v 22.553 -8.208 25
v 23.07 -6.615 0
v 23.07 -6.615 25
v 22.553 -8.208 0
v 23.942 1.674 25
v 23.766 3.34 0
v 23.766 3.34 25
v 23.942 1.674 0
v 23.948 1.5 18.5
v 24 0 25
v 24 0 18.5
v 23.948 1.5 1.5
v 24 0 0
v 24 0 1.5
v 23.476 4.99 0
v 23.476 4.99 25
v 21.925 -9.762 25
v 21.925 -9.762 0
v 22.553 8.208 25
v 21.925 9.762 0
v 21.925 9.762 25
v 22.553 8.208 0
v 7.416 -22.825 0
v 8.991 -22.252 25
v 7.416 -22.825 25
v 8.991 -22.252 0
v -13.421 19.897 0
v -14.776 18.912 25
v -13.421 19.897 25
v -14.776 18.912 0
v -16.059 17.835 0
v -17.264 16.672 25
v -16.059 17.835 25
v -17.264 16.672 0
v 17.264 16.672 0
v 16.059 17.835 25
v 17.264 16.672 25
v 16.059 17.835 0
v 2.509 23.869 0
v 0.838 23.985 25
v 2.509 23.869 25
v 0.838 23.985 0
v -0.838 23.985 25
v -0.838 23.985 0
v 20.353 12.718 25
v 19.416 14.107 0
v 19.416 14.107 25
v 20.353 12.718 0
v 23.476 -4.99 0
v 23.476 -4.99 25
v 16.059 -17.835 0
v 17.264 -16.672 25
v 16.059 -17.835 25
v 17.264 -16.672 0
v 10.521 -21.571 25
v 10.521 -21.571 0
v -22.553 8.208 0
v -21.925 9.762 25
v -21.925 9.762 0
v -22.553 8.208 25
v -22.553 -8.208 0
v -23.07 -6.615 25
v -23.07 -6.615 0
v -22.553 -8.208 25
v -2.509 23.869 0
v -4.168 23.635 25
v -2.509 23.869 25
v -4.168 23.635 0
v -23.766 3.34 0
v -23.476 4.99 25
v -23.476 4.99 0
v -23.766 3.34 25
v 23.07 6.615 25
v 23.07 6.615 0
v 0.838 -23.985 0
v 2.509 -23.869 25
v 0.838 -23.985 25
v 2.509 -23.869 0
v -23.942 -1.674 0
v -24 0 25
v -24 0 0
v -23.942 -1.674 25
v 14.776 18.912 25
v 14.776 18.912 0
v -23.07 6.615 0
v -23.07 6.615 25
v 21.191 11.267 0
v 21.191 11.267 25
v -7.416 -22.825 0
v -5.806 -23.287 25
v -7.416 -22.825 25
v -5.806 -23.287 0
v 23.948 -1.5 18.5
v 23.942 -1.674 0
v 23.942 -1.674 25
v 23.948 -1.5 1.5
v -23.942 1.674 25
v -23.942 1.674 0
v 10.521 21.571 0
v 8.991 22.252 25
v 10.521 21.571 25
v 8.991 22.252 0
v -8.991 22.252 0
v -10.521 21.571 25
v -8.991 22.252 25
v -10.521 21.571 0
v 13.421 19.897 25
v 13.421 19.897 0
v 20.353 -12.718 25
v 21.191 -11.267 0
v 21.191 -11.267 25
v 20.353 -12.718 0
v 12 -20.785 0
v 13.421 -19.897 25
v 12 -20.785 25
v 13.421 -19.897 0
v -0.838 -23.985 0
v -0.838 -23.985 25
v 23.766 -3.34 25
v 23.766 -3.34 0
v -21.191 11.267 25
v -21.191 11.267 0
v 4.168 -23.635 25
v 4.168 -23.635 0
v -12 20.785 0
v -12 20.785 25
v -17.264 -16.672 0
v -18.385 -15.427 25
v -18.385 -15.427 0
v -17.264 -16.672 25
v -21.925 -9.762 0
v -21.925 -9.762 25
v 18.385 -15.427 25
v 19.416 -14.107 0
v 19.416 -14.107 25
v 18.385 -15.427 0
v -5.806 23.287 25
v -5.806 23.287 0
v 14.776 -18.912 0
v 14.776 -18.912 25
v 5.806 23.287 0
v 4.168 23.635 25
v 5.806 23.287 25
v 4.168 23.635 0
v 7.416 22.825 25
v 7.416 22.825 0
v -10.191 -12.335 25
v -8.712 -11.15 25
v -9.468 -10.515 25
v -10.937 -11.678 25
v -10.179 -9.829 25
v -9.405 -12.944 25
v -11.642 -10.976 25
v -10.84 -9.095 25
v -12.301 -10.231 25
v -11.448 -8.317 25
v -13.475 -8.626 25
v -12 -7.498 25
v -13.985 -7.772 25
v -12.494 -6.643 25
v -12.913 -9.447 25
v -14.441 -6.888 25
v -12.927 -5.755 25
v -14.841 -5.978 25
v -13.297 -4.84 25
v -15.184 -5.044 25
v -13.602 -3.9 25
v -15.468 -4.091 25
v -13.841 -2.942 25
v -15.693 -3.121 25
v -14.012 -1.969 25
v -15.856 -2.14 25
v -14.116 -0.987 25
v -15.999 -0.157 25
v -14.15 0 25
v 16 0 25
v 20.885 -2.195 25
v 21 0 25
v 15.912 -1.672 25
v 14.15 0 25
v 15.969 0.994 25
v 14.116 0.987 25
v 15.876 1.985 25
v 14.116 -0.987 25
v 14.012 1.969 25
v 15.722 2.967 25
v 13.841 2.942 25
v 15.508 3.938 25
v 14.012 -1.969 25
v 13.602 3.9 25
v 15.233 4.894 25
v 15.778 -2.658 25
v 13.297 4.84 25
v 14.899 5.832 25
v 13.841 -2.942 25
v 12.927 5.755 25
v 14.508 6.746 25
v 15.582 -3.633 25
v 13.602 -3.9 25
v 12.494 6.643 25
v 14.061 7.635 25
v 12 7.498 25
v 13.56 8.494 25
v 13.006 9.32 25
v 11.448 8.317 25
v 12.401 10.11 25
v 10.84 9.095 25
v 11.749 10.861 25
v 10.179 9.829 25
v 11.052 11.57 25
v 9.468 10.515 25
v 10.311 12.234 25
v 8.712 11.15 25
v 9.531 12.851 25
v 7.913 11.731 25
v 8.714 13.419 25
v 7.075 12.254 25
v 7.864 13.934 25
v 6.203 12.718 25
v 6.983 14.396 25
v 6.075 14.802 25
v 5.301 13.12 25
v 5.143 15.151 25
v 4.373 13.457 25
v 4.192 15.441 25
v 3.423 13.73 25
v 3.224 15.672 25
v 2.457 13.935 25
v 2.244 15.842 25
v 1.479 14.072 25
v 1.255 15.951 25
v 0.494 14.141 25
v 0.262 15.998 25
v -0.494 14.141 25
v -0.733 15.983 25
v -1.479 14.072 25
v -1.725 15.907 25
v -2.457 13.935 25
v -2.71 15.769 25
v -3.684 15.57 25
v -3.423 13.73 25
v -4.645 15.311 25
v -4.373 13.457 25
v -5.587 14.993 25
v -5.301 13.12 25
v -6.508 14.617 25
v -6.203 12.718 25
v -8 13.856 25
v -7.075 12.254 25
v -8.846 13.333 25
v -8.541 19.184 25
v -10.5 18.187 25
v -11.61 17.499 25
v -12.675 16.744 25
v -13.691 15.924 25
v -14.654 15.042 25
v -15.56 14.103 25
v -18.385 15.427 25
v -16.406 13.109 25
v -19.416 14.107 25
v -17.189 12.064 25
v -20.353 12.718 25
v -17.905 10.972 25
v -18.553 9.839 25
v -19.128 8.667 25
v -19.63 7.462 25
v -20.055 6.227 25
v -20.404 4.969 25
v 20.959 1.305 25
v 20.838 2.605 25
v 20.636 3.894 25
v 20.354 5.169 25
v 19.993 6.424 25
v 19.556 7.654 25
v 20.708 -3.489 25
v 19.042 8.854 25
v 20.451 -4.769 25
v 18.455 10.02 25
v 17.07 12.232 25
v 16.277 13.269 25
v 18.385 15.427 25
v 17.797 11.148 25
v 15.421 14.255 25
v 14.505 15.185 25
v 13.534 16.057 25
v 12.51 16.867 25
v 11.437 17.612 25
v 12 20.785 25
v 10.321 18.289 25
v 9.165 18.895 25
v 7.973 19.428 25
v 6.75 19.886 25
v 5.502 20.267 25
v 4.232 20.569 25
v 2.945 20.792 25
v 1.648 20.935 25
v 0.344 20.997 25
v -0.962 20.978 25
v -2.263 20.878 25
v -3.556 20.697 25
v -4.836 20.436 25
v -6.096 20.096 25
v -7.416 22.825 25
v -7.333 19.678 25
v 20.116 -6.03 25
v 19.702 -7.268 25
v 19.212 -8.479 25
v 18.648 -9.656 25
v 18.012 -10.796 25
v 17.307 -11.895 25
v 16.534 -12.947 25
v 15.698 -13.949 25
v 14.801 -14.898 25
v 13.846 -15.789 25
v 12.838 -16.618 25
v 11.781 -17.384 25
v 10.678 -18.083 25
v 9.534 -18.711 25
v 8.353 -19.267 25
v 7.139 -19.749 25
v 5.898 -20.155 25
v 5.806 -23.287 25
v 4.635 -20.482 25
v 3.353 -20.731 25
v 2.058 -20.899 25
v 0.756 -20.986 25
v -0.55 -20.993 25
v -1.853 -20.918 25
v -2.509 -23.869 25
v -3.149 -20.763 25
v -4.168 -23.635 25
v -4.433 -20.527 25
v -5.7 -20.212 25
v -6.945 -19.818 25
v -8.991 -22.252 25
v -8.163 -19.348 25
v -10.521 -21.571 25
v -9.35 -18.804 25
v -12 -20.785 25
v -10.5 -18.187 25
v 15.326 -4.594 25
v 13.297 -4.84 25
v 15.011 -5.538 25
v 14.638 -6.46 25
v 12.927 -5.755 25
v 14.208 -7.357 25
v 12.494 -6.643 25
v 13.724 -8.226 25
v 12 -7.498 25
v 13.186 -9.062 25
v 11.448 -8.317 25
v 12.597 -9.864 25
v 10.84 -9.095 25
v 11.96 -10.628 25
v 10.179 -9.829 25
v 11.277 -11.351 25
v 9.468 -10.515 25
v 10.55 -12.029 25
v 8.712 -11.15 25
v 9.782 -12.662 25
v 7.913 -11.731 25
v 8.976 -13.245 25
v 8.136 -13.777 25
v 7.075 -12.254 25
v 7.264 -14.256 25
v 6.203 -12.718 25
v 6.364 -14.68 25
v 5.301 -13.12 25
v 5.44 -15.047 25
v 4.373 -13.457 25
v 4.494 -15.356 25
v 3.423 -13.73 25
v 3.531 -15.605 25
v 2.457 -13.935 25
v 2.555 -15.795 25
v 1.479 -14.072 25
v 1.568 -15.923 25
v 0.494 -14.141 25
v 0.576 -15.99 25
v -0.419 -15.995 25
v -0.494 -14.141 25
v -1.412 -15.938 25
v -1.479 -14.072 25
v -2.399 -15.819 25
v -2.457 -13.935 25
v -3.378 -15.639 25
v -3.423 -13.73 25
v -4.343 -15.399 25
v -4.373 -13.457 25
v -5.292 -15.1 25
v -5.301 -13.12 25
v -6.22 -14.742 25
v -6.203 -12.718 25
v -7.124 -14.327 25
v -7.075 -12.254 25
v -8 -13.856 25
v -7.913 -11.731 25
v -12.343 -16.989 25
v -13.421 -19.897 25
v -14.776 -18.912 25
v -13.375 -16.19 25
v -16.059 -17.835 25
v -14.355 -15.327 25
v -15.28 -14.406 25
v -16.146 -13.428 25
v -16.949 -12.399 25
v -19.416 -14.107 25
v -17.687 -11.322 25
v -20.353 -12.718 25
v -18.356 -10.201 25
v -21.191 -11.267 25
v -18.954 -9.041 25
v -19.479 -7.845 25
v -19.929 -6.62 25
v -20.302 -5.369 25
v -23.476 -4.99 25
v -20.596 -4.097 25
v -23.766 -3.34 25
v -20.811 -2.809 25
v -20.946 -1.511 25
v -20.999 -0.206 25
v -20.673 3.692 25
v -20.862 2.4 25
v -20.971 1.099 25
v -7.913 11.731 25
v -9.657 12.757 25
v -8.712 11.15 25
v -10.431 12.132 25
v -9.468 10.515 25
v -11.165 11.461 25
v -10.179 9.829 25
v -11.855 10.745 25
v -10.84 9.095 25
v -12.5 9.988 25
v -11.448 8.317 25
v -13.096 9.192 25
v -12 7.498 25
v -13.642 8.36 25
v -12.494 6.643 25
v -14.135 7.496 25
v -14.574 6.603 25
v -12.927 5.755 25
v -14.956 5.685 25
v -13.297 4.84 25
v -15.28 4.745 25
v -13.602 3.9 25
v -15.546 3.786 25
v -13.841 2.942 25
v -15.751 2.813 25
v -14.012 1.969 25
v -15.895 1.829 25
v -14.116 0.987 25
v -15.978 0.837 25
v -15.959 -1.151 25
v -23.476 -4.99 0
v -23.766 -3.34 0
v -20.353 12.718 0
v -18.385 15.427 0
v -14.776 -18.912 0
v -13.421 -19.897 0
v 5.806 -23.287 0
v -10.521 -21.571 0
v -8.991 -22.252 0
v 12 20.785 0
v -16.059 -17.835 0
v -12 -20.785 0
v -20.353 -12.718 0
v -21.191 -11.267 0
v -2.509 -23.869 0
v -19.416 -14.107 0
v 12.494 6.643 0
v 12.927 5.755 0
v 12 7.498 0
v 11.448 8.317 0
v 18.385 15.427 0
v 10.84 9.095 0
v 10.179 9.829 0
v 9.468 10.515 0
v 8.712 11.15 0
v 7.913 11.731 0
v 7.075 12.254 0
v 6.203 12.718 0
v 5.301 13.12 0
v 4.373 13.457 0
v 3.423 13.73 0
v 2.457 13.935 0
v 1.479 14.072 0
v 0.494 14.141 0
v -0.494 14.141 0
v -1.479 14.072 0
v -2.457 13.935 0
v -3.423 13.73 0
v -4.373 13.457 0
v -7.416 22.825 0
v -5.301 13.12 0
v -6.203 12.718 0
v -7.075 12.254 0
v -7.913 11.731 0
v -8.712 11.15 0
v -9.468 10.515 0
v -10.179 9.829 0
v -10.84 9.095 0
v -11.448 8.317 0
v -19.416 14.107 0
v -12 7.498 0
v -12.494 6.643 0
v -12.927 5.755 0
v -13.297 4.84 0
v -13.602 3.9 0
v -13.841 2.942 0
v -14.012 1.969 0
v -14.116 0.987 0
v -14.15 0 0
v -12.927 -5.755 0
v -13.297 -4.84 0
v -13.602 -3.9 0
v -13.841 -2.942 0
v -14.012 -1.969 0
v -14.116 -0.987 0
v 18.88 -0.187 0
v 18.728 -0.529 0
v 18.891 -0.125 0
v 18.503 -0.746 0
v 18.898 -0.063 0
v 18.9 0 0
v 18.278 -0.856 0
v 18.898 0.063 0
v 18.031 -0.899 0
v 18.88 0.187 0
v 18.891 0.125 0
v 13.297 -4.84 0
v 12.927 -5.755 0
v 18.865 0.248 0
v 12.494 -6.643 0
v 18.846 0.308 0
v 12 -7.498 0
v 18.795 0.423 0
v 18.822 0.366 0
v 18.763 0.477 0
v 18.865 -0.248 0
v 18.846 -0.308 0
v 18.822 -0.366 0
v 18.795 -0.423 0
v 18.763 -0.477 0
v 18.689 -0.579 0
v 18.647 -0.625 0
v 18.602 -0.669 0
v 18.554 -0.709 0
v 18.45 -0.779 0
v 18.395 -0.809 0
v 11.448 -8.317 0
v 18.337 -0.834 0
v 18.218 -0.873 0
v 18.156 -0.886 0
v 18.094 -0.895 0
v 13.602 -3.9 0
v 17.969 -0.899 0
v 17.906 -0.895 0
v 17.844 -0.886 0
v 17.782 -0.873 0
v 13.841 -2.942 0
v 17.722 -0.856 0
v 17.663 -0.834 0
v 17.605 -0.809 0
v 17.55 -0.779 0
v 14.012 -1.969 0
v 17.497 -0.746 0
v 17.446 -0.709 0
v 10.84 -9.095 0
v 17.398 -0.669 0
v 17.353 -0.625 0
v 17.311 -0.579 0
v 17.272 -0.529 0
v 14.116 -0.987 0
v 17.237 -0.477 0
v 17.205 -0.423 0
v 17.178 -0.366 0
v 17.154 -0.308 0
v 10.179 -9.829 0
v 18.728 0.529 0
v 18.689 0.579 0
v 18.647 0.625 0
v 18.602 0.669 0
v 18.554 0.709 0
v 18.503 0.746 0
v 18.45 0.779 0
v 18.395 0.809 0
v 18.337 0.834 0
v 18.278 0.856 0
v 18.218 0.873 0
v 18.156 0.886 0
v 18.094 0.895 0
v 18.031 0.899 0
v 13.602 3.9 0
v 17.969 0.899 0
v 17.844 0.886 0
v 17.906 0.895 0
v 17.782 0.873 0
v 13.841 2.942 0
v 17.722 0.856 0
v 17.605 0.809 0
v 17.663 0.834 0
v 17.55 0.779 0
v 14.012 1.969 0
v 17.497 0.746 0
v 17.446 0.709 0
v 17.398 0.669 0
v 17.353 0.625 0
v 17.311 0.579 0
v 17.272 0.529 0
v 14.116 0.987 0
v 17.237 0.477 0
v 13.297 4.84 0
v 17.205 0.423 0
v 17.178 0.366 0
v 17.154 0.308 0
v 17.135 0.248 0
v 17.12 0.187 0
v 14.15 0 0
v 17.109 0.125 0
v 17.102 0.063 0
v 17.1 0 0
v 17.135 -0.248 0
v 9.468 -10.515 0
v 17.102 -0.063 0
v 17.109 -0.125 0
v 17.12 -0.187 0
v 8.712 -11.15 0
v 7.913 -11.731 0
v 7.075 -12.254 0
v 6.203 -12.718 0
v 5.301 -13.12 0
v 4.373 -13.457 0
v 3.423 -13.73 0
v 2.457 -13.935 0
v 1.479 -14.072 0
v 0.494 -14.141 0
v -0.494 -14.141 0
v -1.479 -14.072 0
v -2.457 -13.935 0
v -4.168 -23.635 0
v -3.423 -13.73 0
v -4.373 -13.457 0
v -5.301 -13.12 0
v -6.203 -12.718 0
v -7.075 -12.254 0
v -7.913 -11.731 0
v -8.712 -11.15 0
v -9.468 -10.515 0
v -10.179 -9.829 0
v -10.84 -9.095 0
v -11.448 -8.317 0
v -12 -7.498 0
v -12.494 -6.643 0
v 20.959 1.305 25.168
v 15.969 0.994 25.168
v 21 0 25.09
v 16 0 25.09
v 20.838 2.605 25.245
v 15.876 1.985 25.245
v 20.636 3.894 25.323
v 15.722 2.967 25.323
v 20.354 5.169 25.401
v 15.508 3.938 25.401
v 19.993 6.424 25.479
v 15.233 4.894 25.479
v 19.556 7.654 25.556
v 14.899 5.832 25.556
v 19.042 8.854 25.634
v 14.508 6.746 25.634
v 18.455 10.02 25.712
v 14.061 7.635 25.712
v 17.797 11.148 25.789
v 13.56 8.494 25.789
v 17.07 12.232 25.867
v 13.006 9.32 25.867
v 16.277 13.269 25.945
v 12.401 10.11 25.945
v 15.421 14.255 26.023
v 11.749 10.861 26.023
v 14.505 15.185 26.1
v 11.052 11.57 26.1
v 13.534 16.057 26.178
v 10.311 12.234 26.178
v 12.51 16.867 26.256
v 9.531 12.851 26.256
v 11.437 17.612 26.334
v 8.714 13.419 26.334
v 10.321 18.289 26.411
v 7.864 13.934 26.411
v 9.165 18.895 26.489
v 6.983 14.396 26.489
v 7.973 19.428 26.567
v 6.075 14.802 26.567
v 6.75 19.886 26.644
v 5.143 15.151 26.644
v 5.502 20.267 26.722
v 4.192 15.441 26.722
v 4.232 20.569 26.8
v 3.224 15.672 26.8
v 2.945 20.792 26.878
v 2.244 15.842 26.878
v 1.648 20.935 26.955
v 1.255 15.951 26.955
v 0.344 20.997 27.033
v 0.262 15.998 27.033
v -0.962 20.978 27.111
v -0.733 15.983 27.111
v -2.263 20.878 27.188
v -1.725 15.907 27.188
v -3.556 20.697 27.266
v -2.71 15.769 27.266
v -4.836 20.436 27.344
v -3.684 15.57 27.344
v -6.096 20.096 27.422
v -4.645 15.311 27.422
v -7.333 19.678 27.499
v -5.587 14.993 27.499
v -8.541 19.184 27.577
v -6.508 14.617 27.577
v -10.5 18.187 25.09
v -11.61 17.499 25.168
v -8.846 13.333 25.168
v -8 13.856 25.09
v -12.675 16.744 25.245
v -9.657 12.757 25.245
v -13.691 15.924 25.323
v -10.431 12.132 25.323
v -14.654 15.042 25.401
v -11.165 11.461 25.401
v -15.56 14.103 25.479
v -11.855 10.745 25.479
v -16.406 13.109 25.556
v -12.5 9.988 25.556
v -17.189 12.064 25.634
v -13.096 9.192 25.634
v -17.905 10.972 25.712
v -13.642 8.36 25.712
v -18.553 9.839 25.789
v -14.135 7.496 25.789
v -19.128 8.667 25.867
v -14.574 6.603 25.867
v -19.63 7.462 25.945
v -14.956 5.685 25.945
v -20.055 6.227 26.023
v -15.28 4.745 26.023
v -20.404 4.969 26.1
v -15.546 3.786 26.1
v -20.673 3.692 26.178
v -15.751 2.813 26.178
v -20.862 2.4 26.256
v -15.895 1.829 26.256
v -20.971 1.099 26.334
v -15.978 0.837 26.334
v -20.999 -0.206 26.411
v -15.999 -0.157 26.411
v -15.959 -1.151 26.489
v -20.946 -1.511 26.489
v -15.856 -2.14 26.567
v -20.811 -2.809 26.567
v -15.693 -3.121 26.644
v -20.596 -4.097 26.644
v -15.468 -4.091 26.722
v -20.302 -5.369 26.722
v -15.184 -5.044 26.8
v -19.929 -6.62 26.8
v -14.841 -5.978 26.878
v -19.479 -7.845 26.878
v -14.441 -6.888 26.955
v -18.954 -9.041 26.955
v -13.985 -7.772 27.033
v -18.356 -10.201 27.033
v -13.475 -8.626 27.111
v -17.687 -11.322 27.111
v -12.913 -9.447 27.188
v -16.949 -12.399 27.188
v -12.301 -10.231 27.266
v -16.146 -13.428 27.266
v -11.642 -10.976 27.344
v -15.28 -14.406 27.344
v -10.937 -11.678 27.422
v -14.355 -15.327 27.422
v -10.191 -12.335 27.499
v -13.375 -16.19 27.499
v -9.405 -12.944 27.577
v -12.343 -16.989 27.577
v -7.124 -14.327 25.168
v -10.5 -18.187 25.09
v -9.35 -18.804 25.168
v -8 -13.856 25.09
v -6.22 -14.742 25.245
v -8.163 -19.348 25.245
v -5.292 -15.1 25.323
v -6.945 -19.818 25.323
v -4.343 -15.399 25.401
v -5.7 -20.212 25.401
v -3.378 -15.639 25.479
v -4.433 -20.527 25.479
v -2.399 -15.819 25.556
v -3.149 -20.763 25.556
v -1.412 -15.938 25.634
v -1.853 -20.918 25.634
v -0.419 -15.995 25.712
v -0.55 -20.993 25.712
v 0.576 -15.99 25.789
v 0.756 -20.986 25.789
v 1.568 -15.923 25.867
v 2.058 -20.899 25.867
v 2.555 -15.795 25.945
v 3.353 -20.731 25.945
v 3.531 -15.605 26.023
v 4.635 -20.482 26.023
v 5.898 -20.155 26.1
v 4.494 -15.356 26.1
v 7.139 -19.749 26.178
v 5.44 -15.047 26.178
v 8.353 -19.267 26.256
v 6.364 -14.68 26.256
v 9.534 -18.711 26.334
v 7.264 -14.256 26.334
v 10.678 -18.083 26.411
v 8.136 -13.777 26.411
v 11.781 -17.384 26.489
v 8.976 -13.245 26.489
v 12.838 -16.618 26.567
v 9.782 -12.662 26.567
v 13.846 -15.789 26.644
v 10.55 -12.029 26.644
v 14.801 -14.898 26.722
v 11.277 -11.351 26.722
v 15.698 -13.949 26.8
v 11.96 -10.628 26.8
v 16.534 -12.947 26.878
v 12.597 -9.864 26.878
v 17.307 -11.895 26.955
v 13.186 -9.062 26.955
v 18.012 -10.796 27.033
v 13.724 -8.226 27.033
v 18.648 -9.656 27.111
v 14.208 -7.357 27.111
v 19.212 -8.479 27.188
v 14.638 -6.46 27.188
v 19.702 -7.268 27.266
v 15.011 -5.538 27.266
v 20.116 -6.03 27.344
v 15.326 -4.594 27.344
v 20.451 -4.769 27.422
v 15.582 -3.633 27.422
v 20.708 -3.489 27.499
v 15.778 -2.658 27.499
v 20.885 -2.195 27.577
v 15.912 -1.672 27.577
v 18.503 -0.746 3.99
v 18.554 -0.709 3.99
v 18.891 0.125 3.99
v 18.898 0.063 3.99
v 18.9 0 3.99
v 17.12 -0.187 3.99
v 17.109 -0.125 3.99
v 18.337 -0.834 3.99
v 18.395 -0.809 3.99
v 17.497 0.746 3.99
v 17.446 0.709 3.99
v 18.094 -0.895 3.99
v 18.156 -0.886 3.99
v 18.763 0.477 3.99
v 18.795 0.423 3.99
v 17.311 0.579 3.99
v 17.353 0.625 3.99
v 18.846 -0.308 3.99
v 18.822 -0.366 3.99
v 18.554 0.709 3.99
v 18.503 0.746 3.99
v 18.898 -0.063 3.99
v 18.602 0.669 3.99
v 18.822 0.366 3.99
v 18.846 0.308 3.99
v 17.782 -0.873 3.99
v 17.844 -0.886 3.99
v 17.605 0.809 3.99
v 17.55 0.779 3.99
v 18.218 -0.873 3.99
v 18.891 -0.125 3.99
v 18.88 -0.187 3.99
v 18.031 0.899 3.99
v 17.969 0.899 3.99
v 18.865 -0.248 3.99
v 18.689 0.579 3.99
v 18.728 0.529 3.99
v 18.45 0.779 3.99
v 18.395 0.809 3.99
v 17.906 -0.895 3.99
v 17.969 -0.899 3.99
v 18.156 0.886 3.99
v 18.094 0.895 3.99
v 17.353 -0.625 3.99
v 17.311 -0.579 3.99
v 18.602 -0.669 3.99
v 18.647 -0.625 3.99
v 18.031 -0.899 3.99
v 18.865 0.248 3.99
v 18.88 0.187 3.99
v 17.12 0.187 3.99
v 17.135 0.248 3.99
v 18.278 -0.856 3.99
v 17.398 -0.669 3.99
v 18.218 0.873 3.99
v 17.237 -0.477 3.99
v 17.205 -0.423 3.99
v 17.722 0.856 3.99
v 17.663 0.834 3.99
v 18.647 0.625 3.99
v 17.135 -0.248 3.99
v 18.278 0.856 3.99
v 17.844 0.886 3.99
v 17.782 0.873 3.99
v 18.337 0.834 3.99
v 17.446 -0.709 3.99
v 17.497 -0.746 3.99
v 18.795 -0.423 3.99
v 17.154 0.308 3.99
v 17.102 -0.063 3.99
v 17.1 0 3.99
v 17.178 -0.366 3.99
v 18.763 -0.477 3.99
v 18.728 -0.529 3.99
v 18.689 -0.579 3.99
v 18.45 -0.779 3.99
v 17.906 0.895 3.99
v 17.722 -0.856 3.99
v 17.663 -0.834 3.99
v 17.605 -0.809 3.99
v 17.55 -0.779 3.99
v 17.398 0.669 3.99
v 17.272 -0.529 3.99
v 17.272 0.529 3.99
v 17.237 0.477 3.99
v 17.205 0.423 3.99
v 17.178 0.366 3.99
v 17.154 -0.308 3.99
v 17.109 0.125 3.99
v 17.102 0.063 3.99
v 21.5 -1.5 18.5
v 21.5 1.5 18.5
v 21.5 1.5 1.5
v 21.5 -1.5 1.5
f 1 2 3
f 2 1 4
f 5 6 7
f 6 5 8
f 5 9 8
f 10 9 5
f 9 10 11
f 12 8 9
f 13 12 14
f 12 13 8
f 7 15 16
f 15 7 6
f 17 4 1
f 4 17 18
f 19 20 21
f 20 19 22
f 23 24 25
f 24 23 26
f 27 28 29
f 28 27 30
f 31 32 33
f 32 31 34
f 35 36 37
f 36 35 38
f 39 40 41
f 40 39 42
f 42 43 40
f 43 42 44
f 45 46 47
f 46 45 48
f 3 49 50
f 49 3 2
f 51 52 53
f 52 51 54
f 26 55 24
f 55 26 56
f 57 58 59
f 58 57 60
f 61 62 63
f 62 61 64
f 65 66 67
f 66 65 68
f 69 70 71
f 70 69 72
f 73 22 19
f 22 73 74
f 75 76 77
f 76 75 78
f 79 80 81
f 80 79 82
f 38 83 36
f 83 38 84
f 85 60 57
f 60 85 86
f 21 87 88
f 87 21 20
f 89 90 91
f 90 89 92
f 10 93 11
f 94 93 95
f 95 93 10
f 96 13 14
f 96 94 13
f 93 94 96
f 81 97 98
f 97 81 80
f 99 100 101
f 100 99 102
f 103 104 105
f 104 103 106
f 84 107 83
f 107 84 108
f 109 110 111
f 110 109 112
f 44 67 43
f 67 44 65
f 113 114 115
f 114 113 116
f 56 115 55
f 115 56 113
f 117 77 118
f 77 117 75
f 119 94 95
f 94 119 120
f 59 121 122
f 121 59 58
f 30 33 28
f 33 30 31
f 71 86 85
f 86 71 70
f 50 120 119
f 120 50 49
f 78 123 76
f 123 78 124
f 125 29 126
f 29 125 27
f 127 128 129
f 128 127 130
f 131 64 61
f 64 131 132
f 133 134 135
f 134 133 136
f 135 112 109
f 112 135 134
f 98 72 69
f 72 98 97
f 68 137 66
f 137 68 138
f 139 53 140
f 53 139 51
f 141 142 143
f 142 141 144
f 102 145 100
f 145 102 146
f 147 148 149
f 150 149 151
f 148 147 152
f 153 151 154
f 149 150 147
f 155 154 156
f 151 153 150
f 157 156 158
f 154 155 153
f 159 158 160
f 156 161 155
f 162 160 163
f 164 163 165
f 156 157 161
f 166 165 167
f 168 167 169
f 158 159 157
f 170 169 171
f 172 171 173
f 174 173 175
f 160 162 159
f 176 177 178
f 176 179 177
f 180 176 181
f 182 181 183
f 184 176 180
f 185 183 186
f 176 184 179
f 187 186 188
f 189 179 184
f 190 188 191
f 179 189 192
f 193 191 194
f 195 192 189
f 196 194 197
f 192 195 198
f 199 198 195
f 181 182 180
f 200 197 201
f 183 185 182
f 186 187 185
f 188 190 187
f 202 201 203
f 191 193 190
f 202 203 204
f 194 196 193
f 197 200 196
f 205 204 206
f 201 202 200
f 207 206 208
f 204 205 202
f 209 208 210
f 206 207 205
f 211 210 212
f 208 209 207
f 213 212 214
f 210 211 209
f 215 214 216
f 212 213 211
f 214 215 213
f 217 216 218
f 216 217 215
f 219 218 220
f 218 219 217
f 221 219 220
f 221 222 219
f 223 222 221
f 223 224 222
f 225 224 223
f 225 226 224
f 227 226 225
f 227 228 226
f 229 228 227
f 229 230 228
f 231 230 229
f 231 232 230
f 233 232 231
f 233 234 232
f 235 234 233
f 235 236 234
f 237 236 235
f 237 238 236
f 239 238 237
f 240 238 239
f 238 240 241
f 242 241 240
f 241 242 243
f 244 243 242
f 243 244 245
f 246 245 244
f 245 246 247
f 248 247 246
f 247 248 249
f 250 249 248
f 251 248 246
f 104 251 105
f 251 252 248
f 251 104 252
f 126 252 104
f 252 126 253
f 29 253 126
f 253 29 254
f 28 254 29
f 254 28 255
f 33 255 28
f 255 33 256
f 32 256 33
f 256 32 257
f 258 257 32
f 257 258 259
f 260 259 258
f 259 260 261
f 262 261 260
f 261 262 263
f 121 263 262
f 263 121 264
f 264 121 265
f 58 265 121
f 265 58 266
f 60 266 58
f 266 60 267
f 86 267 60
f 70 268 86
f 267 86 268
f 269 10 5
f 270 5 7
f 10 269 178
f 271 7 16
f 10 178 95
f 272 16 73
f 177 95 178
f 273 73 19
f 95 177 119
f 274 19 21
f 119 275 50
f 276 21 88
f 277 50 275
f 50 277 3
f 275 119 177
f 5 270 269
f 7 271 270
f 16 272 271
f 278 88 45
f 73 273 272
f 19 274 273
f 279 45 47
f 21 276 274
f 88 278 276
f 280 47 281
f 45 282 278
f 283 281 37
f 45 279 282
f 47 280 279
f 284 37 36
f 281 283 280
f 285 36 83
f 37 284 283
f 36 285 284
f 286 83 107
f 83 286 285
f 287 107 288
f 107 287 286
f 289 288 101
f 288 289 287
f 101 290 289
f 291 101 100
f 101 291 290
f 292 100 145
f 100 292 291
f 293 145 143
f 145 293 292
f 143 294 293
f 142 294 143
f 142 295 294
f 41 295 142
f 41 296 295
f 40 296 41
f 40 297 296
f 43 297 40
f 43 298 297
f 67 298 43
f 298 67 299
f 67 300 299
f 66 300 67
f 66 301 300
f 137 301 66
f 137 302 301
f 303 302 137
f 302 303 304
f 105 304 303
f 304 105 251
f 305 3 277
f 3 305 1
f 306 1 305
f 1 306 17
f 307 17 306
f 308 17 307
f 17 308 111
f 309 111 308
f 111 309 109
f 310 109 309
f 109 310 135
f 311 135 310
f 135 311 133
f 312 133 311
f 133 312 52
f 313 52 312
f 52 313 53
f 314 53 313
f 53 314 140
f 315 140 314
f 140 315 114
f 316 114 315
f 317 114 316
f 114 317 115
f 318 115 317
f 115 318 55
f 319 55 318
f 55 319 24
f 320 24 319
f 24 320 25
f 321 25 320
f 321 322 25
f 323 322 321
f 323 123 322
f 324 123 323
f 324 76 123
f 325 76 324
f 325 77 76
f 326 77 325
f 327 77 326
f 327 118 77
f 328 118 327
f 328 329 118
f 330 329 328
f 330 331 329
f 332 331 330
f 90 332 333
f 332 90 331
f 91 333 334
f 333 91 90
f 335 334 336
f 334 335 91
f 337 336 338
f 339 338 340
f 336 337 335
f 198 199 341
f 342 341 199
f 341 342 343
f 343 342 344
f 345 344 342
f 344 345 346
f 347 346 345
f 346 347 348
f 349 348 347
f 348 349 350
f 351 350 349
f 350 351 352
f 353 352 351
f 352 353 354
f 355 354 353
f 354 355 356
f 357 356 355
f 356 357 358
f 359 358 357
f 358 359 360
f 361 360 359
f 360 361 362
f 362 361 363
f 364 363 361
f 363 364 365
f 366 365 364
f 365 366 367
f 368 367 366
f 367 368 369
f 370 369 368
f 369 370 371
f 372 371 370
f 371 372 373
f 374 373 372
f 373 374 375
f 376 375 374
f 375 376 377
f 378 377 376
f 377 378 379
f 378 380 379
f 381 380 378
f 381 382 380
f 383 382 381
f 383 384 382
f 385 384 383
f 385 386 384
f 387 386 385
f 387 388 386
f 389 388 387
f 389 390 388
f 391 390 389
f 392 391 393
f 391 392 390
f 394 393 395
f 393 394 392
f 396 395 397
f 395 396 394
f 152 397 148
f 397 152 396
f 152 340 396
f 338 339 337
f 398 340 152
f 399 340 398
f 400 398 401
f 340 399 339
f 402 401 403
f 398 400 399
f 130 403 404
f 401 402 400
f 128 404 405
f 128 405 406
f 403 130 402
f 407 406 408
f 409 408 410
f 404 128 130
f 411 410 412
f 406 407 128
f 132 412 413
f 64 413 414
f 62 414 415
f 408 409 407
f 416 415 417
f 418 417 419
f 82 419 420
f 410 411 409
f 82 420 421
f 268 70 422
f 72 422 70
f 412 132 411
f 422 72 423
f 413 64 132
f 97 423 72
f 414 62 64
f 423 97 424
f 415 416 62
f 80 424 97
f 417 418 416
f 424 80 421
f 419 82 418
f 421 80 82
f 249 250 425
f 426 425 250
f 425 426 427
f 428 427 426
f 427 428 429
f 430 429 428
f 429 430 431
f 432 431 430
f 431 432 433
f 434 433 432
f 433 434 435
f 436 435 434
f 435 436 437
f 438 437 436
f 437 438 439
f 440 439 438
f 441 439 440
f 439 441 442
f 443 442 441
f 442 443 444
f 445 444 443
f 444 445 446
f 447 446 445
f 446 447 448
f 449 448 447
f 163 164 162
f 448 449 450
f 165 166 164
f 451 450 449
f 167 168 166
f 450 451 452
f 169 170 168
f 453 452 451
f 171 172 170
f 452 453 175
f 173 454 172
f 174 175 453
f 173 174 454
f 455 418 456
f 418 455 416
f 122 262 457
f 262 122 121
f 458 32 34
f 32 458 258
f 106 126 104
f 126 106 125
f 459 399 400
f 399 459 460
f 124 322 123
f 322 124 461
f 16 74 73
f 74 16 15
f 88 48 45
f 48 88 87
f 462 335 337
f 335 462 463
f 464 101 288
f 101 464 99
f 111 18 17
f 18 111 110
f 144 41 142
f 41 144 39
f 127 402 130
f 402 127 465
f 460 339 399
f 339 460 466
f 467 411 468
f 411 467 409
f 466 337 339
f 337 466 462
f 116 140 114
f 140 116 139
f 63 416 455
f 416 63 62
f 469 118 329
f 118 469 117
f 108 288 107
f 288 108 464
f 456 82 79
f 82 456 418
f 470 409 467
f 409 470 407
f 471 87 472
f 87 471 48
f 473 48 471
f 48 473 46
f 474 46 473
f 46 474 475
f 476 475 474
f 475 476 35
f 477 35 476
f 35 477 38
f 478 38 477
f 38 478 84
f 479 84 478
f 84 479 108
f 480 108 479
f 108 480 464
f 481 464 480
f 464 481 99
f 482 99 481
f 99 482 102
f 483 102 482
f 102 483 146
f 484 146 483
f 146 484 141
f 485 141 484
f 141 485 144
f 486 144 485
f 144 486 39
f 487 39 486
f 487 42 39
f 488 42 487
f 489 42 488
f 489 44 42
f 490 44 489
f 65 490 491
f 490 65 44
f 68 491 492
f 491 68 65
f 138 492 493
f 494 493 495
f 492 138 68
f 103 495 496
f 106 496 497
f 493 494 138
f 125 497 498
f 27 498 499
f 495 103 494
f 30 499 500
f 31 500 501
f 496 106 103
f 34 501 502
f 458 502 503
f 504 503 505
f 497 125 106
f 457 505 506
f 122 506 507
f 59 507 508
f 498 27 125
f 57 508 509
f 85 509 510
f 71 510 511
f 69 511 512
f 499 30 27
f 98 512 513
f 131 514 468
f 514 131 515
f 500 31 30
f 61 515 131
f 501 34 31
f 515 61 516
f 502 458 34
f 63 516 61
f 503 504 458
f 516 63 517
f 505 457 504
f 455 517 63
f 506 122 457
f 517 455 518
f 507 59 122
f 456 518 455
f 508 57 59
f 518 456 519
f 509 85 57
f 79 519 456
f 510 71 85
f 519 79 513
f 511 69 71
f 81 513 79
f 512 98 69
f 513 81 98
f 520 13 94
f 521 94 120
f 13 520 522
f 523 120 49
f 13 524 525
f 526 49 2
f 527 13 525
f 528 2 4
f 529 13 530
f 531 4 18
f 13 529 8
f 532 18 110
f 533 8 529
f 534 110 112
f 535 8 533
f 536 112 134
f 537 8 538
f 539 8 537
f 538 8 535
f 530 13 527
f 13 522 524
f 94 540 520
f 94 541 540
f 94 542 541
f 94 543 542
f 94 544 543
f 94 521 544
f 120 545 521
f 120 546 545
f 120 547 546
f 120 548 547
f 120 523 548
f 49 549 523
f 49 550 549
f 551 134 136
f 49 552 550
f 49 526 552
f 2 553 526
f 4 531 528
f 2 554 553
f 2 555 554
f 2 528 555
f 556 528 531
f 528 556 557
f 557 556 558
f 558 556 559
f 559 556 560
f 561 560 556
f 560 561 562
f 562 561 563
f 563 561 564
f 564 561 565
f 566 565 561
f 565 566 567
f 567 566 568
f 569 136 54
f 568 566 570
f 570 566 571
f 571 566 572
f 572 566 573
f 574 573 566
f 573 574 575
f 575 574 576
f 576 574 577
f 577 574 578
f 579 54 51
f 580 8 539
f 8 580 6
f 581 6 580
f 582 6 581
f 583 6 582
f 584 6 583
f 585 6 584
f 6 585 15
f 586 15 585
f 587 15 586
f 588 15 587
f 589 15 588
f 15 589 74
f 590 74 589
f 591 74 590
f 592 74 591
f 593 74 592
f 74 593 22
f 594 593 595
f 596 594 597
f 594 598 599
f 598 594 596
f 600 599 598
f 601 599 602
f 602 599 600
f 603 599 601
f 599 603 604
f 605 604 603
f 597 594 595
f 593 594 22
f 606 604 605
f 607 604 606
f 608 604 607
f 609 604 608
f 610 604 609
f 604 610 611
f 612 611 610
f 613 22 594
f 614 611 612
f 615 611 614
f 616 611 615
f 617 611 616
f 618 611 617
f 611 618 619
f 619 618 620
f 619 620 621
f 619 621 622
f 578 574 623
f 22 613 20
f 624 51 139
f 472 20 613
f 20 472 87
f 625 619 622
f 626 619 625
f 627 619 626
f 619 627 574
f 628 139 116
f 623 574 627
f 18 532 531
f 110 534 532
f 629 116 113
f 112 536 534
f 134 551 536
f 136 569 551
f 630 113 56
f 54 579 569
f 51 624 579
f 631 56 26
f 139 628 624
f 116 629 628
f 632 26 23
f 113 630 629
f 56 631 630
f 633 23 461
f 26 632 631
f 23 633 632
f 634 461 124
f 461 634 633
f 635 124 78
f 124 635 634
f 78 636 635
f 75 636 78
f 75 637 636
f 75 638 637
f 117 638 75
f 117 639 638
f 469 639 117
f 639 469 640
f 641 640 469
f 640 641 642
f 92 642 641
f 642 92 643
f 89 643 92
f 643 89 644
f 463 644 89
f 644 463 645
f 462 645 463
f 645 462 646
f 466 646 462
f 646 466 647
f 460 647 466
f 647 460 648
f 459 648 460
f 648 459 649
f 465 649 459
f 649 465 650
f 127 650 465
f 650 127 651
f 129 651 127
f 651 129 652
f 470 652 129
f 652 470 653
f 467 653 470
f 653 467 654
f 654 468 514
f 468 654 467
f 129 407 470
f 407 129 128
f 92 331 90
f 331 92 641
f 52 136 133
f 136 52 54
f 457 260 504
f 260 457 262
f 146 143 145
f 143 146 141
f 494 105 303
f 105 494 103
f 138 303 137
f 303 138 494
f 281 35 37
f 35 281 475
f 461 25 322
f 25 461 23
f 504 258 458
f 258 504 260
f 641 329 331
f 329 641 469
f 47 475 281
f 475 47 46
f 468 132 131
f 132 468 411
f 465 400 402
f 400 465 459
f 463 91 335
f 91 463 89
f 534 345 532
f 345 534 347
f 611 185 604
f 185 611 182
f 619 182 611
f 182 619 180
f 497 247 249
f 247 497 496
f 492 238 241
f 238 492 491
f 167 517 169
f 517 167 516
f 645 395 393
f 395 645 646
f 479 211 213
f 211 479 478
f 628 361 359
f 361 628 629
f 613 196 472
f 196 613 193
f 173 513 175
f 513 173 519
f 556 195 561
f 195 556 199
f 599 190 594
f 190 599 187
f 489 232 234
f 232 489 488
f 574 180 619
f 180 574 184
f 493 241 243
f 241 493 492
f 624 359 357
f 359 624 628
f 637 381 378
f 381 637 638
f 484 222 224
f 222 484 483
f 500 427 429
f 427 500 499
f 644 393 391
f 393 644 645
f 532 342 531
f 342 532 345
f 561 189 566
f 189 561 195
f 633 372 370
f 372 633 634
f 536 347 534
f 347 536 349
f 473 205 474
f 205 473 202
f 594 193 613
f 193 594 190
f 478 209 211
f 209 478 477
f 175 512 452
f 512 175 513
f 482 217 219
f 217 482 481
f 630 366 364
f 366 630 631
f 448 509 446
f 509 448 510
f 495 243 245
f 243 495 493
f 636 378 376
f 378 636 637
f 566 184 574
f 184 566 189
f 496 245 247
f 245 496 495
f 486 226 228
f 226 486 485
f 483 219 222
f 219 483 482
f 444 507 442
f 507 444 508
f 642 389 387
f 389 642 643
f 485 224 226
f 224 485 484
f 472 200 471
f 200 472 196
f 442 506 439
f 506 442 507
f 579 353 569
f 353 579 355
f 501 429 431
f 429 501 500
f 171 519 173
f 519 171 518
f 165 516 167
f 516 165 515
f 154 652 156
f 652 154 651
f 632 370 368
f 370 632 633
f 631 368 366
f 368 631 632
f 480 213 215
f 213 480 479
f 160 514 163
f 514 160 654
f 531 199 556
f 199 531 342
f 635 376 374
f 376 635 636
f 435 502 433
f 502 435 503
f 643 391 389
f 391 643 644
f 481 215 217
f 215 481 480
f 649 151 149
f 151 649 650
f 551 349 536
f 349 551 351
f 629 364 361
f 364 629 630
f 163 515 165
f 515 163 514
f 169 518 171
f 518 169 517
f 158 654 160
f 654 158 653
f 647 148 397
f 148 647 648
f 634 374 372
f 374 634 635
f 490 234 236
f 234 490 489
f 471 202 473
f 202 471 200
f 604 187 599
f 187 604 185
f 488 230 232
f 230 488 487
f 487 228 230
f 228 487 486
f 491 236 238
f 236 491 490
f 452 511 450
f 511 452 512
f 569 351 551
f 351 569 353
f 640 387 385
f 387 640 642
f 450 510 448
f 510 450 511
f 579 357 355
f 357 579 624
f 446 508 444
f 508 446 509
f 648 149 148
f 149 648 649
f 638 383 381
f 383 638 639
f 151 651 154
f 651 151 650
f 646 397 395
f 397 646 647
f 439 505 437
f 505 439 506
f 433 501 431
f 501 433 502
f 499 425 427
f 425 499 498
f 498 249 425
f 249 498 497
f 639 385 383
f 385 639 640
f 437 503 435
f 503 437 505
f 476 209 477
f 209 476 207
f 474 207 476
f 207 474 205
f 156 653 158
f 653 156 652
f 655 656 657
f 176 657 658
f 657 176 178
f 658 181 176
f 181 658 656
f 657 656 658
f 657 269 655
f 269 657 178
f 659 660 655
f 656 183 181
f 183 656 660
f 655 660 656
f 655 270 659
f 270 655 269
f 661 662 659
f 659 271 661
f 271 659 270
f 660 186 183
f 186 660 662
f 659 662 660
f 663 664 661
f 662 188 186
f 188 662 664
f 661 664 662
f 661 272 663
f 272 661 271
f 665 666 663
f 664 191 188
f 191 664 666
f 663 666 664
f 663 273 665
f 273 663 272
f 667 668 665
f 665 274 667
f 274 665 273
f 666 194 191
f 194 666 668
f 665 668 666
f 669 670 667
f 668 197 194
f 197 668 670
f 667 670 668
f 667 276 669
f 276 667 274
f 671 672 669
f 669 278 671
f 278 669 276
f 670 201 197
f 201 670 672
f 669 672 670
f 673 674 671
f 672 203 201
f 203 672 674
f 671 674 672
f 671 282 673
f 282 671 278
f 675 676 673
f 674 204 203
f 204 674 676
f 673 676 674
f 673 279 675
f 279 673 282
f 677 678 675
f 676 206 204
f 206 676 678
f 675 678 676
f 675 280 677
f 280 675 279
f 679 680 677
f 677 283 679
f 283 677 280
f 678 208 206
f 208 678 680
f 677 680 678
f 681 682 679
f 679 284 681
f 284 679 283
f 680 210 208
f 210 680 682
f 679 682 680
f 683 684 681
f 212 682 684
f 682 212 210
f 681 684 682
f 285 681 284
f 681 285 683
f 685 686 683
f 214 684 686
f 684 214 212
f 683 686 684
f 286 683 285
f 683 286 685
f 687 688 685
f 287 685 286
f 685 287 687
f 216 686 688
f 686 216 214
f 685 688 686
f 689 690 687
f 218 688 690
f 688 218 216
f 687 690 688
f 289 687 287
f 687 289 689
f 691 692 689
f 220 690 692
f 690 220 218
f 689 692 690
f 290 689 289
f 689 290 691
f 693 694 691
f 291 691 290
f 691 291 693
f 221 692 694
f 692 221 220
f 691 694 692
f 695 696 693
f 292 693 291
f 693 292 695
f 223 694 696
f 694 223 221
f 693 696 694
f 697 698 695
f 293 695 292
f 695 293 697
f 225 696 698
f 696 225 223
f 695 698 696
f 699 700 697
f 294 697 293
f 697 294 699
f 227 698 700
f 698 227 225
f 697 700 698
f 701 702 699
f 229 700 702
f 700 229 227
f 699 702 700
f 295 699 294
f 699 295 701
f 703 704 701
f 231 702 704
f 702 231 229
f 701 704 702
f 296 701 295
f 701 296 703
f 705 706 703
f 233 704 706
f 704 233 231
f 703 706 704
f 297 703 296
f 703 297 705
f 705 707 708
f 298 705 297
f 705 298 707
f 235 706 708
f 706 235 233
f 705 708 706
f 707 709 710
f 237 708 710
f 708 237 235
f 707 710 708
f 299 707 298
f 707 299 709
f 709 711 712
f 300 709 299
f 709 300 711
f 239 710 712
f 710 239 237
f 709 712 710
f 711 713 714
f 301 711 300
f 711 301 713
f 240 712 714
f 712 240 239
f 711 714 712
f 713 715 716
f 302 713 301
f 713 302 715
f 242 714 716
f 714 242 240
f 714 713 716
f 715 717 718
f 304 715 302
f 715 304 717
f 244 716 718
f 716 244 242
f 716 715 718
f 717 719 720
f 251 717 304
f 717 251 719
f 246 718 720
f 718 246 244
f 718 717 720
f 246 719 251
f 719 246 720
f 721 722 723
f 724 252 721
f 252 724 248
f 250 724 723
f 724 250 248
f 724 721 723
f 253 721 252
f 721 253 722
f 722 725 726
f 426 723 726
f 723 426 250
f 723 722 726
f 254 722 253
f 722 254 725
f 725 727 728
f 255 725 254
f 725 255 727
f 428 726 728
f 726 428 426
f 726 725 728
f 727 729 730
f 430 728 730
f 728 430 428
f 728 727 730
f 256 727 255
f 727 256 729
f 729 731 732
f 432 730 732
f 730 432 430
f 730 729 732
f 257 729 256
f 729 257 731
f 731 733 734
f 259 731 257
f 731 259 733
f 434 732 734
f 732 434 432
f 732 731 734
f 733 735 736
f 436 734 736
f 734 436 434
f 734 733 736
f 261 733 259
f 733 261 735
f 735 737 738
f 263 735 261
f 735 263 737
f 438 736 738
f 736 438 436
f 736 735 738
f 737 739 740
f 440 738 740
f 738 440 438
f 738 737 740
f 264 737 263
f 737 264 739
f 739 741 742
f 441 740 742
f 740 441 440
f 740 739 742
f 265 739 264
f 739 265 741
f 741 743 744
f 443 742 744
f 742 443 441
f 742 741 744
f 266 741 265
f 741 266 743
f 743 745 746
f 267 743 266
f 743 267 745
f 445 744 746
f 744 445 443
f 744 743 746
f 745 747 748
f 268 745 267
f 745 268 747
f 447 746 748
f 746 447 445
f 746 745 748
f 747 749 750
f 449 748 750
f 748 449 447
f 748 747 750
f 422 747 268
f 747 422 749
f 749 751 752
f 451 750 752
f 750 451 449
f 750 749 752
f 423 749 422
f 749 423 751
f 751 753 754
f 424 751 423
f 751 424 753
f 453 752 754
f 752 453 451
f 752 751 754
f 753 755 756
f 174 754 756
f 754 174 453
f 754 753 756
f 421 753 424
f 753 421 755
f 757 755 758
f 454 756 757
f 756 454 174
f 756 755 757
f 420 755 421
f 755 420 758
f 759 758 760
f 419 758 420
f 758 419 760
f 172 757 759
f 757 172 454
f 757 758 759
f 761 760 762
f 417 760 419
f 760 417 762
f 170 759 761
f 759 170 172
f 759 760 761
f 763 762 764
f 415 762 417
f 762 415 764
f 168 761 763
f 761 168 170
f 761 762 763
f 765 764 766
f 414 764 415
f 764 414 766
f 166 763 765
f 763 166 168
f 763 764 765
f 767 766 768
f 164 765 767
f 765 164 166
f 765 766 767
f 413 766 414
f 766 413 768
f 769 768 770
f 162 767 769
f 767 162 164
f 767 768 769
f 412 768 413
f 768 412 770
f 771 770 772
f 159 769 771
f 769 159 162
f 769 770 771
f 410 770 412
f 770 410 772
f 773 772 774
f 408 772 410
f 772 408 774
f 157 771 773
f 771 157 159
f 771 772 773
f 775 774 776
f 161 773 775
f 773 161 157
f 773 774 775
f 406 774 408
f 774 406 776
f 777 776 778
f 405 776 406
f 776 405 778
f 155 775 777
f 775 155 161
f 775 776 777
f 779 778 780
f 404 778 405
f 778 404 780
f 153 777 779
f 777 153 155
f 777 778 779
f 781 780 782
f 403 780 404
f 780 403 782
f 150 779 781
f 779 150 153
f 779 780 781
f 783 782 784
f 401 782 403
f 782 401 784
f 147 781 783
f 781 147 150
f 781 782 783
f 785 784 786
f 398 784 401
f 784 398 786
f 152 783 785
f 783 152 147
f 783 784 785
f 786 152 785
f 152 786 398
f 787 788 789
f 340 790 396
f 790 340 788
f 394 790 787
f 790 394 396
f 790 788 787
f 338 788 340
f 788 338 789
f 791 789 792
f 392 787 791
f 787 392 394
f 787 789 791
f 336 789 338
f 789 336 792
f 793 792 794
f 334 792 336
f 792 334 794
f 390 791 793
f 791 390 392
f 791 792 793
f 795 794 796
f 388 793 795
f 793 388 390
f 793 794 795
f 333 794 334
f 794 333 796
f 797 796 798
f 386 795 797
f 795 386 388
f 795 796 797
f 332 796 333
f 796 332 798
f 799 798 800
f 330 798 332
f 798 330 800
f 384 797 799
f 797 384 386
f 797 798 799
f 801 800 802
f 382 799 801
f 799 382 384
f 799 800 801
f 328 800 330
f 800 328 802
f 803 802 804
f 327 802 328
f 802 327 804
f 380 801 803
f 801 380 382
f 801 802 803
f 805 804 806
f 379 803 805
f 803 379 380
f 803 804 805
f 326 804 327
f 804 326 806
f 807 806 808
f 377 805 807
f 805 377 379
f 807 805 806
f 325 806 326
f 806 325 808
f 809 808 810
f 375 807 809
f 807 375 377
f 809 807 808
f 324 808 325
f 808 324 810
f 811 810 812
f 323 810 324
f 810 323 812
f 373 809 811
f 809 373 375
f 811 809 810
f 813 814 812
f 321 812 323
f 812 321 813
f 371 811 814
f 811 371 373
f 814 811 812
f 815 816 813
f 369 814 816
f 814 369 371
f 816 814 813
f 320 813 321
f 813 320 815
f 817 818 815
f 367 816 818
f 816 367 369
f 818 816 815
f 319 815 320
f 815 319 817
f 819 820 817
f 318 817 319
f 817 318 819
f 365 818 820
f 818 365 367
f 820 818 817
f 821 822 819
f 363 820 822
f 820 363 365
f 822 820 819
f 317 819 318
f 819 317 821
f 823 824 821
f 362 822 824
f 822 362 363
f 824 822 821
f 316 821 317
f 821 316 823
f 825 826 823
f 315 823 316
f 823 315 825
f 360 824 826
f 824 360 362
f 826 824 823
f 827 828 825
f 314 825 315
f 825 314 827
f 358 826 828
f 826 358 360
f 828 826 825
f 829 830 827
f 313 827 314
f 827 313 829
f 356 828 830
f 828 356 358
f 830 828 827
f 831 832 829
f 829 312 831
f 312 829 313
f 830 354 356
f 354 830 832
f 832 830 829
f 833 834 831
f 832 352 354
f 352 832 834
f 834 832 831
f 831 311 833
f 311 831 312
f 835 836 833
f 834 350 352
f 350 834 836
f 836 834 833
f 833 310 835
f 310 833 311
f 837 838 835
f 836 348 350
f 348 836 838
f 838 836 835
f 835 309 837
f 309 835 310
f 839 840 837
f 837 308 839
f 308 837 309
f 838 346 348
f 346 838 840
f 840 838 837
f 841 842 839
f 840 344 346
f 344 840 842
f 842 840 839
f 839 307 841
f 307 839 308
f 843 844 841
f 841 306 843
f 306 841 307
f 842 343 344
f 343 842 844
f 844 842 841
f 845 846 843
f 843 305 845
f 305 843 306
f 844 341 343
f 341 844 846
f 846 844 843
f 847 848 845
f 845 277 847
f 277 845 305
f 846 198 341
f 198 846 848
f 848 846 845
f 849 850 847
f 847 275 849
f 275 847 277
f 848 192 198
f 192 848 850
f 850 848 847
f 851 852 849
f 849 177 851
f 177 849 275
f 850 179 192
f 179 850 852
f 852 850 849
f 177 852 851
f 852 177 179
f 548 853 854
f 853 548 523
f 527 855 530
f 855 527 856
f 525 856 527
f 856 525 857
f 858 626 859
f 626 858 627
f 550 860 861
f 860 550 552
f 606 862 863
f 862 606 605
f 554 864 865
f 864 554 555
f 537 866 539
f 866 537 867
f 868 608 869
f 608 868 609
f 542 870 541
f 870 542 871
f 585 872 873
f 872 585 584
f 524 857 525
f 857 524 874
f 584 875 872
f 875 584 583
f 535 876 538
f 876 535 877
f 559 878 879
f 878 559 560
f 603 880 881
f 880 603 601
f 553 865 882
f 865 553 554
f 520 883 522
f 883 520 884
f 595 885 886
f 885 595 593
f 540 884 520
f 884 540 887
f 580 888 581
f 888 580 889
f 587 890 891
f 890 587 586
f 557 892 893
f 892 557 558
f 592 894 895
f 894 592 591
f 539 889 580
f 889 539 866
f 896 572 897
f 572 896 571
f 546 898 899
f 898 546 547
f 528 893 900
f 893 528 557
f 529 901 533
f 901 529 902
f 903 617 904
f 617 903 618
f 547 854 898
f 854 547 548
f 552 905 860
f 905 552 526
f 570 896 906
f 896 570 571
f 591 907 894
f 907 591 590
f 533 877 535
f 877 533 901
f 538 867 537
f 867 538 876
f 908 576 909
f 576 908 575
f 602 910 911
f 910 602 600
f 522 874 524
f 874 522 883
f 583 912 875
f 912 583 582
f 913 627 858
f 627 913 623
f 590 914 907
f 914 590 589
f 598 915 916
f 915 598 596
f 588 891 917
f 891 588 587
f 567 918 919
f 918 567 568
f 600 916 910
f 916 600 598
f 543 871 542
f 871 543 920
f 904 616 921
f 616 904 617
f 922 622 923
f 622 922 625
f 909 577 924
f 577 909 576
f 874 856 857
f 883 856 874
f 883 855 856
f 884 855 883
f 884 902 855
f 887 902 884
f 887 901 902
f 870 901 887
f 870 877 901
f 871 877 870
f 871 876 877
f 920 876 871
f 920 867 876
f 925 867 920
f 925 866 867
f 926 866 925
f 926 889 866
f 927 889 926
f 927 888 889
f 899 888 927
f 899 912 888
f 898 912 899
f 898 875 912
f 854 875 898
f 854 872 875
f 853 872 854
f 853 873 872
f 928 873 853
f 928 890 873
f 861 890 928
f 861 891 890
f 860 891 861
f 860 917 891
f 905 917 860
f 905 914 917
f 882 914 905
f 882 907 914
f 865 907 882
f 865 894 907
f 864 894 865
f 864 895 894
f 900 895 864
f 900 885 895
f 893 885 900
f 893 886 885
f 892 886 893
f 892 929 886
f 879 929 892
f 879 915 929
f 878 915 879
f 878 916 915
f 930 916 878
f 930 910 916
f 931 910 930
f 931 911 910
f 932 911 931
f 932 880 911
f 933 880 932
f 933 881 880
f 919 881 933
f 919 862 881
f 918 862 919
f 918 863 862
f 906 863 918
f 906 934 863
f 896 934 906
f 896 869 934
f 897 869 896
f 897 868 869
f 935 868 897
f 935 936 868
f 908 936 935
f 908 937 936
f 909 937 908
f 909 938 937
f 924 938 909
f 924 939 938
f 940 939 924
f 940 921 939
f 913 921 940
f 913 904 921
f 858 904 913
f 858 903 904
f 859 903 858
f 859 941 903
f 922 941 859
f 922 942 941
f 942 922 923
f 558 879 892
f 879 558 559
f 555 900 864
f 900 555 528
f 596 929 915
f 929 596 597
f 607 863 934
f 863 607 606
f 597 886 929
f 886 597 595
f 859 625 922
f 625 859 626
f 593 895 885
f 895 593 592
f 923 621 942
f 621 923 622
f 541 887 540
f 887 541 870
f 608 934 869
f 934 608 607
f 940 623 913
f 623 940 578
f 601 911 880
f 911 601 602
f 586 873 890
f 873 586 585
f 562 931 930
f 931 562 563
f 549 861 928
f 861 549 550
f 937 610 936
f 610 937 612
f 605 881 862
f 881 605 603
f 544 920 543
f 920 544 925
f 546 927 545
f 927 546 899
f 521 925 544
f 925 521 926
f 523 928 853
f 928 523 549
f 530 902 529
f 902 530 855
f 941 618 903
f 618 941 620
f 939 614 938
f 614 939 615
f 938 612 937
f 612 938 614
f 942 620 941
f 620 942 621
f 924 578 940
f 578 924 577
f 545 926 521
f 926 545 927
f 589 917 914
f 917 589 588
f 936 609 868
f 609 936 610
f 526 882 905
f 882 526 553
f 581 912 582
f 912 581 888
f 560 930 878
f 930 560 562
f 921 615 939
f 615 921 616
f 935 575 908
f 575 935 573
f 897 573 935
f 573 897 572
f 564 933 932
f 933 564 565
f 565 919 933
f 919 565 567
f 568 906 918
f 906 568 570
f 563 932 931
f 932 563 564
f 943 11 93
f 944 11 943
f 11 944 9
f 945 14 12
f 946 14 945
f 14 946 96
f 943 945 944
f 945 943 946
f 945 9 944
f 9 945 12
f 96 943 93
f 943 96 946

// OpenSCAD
// Bench anti-backlash sleeve. Print in dimensionally stable nylon or PETG.
// Select "cam", "follower", or "body" and export separately.
part = "cam";
$fn = 90;

bore = 28.3;
outer = 48;
r0 = 16;
r1 = 21;
rise = 1.25;  // mm per radian
segments = 32;

function polar(r, a, z) = [r*cos(a), r*sin(a), z];

module ramp_cell(a, b, z1, z2) {
    polyhedron(
        points = [
            polar(r0, a, 0), polar(r1, a, 0),
            polar(r1, b, 0), polar(r0, b, 0),
            polar(r0, a, z1), polar(r1, a, z1),
            polar(r1, b, z2), polar(r0, b, z2),
        ],
        faces = [[0,1,2,3], [7,6,5], [7,5,4], [0,4,5,1], [1,5,6,2],
                 [2,6,7,3], [3,7,4,0]],
        convexity = 4
    );
}

module cam() {
    difference() {
        union() {
            difference() {
                cylinder(h=25, d=outer);
                translate([0,0,-1]) cylinder(h=27, d=bore);
            }
            // Opposed facing surfaces run on three equal ramps. The 6 degree
            // returns are outside the motion allowed by the limit pin.
            for (i=[0:2])
                translate([0,0,24.99])
                    rotate([0,0,120*i])
                        for (k=[0:segments-1])
                            ramp_cell(114*k/segments, 114*(k+1)/segments,
                                      0.1+rise*114*k/segments*PI/180,
                                      0.1+rise*114*(k+1)/segments*PI/180);
        }
        translate([18,0,-.01]) cylinder(h=4, d=1.8);
        translate([23,0,10]) cube([3,3,17], center=true);
    }
}

module follower() {
    difference() {
        cylinder(h=7, d=44);
        translate([0,0,-1]) cylinder(h=9, d=bore);
        for (i=[0:2])
            rotate([0,0,120*i]) translate([18.5,0,-1]) cylinder(h=9, d=2.6);
        for (i=[0:2])
            rotate([0,0,120*i+60]) translate([19,0,-1]) cylinder(h=9, d=3.4);
    }
}

module body() {
    difference() {
        union() {
            cylinder(h=71, d=44);
            translate([0,0,71]) cylinder(h=25, d=45, $fn=6);
        }
        translate([0,0,-1]) cylinder(h=98, d=bore);
        for (i=[0:2])
            rotate([0,0,120*i+60]) translate([19,0,-1]) cylinder(h=98, d=3.0);
        translate([18,0,-.01]) cylinder(h=5, d=1.8);
    }
}

if (part == "cam") cam();
if (part == "follower") follower();
if (part == "body") body();
